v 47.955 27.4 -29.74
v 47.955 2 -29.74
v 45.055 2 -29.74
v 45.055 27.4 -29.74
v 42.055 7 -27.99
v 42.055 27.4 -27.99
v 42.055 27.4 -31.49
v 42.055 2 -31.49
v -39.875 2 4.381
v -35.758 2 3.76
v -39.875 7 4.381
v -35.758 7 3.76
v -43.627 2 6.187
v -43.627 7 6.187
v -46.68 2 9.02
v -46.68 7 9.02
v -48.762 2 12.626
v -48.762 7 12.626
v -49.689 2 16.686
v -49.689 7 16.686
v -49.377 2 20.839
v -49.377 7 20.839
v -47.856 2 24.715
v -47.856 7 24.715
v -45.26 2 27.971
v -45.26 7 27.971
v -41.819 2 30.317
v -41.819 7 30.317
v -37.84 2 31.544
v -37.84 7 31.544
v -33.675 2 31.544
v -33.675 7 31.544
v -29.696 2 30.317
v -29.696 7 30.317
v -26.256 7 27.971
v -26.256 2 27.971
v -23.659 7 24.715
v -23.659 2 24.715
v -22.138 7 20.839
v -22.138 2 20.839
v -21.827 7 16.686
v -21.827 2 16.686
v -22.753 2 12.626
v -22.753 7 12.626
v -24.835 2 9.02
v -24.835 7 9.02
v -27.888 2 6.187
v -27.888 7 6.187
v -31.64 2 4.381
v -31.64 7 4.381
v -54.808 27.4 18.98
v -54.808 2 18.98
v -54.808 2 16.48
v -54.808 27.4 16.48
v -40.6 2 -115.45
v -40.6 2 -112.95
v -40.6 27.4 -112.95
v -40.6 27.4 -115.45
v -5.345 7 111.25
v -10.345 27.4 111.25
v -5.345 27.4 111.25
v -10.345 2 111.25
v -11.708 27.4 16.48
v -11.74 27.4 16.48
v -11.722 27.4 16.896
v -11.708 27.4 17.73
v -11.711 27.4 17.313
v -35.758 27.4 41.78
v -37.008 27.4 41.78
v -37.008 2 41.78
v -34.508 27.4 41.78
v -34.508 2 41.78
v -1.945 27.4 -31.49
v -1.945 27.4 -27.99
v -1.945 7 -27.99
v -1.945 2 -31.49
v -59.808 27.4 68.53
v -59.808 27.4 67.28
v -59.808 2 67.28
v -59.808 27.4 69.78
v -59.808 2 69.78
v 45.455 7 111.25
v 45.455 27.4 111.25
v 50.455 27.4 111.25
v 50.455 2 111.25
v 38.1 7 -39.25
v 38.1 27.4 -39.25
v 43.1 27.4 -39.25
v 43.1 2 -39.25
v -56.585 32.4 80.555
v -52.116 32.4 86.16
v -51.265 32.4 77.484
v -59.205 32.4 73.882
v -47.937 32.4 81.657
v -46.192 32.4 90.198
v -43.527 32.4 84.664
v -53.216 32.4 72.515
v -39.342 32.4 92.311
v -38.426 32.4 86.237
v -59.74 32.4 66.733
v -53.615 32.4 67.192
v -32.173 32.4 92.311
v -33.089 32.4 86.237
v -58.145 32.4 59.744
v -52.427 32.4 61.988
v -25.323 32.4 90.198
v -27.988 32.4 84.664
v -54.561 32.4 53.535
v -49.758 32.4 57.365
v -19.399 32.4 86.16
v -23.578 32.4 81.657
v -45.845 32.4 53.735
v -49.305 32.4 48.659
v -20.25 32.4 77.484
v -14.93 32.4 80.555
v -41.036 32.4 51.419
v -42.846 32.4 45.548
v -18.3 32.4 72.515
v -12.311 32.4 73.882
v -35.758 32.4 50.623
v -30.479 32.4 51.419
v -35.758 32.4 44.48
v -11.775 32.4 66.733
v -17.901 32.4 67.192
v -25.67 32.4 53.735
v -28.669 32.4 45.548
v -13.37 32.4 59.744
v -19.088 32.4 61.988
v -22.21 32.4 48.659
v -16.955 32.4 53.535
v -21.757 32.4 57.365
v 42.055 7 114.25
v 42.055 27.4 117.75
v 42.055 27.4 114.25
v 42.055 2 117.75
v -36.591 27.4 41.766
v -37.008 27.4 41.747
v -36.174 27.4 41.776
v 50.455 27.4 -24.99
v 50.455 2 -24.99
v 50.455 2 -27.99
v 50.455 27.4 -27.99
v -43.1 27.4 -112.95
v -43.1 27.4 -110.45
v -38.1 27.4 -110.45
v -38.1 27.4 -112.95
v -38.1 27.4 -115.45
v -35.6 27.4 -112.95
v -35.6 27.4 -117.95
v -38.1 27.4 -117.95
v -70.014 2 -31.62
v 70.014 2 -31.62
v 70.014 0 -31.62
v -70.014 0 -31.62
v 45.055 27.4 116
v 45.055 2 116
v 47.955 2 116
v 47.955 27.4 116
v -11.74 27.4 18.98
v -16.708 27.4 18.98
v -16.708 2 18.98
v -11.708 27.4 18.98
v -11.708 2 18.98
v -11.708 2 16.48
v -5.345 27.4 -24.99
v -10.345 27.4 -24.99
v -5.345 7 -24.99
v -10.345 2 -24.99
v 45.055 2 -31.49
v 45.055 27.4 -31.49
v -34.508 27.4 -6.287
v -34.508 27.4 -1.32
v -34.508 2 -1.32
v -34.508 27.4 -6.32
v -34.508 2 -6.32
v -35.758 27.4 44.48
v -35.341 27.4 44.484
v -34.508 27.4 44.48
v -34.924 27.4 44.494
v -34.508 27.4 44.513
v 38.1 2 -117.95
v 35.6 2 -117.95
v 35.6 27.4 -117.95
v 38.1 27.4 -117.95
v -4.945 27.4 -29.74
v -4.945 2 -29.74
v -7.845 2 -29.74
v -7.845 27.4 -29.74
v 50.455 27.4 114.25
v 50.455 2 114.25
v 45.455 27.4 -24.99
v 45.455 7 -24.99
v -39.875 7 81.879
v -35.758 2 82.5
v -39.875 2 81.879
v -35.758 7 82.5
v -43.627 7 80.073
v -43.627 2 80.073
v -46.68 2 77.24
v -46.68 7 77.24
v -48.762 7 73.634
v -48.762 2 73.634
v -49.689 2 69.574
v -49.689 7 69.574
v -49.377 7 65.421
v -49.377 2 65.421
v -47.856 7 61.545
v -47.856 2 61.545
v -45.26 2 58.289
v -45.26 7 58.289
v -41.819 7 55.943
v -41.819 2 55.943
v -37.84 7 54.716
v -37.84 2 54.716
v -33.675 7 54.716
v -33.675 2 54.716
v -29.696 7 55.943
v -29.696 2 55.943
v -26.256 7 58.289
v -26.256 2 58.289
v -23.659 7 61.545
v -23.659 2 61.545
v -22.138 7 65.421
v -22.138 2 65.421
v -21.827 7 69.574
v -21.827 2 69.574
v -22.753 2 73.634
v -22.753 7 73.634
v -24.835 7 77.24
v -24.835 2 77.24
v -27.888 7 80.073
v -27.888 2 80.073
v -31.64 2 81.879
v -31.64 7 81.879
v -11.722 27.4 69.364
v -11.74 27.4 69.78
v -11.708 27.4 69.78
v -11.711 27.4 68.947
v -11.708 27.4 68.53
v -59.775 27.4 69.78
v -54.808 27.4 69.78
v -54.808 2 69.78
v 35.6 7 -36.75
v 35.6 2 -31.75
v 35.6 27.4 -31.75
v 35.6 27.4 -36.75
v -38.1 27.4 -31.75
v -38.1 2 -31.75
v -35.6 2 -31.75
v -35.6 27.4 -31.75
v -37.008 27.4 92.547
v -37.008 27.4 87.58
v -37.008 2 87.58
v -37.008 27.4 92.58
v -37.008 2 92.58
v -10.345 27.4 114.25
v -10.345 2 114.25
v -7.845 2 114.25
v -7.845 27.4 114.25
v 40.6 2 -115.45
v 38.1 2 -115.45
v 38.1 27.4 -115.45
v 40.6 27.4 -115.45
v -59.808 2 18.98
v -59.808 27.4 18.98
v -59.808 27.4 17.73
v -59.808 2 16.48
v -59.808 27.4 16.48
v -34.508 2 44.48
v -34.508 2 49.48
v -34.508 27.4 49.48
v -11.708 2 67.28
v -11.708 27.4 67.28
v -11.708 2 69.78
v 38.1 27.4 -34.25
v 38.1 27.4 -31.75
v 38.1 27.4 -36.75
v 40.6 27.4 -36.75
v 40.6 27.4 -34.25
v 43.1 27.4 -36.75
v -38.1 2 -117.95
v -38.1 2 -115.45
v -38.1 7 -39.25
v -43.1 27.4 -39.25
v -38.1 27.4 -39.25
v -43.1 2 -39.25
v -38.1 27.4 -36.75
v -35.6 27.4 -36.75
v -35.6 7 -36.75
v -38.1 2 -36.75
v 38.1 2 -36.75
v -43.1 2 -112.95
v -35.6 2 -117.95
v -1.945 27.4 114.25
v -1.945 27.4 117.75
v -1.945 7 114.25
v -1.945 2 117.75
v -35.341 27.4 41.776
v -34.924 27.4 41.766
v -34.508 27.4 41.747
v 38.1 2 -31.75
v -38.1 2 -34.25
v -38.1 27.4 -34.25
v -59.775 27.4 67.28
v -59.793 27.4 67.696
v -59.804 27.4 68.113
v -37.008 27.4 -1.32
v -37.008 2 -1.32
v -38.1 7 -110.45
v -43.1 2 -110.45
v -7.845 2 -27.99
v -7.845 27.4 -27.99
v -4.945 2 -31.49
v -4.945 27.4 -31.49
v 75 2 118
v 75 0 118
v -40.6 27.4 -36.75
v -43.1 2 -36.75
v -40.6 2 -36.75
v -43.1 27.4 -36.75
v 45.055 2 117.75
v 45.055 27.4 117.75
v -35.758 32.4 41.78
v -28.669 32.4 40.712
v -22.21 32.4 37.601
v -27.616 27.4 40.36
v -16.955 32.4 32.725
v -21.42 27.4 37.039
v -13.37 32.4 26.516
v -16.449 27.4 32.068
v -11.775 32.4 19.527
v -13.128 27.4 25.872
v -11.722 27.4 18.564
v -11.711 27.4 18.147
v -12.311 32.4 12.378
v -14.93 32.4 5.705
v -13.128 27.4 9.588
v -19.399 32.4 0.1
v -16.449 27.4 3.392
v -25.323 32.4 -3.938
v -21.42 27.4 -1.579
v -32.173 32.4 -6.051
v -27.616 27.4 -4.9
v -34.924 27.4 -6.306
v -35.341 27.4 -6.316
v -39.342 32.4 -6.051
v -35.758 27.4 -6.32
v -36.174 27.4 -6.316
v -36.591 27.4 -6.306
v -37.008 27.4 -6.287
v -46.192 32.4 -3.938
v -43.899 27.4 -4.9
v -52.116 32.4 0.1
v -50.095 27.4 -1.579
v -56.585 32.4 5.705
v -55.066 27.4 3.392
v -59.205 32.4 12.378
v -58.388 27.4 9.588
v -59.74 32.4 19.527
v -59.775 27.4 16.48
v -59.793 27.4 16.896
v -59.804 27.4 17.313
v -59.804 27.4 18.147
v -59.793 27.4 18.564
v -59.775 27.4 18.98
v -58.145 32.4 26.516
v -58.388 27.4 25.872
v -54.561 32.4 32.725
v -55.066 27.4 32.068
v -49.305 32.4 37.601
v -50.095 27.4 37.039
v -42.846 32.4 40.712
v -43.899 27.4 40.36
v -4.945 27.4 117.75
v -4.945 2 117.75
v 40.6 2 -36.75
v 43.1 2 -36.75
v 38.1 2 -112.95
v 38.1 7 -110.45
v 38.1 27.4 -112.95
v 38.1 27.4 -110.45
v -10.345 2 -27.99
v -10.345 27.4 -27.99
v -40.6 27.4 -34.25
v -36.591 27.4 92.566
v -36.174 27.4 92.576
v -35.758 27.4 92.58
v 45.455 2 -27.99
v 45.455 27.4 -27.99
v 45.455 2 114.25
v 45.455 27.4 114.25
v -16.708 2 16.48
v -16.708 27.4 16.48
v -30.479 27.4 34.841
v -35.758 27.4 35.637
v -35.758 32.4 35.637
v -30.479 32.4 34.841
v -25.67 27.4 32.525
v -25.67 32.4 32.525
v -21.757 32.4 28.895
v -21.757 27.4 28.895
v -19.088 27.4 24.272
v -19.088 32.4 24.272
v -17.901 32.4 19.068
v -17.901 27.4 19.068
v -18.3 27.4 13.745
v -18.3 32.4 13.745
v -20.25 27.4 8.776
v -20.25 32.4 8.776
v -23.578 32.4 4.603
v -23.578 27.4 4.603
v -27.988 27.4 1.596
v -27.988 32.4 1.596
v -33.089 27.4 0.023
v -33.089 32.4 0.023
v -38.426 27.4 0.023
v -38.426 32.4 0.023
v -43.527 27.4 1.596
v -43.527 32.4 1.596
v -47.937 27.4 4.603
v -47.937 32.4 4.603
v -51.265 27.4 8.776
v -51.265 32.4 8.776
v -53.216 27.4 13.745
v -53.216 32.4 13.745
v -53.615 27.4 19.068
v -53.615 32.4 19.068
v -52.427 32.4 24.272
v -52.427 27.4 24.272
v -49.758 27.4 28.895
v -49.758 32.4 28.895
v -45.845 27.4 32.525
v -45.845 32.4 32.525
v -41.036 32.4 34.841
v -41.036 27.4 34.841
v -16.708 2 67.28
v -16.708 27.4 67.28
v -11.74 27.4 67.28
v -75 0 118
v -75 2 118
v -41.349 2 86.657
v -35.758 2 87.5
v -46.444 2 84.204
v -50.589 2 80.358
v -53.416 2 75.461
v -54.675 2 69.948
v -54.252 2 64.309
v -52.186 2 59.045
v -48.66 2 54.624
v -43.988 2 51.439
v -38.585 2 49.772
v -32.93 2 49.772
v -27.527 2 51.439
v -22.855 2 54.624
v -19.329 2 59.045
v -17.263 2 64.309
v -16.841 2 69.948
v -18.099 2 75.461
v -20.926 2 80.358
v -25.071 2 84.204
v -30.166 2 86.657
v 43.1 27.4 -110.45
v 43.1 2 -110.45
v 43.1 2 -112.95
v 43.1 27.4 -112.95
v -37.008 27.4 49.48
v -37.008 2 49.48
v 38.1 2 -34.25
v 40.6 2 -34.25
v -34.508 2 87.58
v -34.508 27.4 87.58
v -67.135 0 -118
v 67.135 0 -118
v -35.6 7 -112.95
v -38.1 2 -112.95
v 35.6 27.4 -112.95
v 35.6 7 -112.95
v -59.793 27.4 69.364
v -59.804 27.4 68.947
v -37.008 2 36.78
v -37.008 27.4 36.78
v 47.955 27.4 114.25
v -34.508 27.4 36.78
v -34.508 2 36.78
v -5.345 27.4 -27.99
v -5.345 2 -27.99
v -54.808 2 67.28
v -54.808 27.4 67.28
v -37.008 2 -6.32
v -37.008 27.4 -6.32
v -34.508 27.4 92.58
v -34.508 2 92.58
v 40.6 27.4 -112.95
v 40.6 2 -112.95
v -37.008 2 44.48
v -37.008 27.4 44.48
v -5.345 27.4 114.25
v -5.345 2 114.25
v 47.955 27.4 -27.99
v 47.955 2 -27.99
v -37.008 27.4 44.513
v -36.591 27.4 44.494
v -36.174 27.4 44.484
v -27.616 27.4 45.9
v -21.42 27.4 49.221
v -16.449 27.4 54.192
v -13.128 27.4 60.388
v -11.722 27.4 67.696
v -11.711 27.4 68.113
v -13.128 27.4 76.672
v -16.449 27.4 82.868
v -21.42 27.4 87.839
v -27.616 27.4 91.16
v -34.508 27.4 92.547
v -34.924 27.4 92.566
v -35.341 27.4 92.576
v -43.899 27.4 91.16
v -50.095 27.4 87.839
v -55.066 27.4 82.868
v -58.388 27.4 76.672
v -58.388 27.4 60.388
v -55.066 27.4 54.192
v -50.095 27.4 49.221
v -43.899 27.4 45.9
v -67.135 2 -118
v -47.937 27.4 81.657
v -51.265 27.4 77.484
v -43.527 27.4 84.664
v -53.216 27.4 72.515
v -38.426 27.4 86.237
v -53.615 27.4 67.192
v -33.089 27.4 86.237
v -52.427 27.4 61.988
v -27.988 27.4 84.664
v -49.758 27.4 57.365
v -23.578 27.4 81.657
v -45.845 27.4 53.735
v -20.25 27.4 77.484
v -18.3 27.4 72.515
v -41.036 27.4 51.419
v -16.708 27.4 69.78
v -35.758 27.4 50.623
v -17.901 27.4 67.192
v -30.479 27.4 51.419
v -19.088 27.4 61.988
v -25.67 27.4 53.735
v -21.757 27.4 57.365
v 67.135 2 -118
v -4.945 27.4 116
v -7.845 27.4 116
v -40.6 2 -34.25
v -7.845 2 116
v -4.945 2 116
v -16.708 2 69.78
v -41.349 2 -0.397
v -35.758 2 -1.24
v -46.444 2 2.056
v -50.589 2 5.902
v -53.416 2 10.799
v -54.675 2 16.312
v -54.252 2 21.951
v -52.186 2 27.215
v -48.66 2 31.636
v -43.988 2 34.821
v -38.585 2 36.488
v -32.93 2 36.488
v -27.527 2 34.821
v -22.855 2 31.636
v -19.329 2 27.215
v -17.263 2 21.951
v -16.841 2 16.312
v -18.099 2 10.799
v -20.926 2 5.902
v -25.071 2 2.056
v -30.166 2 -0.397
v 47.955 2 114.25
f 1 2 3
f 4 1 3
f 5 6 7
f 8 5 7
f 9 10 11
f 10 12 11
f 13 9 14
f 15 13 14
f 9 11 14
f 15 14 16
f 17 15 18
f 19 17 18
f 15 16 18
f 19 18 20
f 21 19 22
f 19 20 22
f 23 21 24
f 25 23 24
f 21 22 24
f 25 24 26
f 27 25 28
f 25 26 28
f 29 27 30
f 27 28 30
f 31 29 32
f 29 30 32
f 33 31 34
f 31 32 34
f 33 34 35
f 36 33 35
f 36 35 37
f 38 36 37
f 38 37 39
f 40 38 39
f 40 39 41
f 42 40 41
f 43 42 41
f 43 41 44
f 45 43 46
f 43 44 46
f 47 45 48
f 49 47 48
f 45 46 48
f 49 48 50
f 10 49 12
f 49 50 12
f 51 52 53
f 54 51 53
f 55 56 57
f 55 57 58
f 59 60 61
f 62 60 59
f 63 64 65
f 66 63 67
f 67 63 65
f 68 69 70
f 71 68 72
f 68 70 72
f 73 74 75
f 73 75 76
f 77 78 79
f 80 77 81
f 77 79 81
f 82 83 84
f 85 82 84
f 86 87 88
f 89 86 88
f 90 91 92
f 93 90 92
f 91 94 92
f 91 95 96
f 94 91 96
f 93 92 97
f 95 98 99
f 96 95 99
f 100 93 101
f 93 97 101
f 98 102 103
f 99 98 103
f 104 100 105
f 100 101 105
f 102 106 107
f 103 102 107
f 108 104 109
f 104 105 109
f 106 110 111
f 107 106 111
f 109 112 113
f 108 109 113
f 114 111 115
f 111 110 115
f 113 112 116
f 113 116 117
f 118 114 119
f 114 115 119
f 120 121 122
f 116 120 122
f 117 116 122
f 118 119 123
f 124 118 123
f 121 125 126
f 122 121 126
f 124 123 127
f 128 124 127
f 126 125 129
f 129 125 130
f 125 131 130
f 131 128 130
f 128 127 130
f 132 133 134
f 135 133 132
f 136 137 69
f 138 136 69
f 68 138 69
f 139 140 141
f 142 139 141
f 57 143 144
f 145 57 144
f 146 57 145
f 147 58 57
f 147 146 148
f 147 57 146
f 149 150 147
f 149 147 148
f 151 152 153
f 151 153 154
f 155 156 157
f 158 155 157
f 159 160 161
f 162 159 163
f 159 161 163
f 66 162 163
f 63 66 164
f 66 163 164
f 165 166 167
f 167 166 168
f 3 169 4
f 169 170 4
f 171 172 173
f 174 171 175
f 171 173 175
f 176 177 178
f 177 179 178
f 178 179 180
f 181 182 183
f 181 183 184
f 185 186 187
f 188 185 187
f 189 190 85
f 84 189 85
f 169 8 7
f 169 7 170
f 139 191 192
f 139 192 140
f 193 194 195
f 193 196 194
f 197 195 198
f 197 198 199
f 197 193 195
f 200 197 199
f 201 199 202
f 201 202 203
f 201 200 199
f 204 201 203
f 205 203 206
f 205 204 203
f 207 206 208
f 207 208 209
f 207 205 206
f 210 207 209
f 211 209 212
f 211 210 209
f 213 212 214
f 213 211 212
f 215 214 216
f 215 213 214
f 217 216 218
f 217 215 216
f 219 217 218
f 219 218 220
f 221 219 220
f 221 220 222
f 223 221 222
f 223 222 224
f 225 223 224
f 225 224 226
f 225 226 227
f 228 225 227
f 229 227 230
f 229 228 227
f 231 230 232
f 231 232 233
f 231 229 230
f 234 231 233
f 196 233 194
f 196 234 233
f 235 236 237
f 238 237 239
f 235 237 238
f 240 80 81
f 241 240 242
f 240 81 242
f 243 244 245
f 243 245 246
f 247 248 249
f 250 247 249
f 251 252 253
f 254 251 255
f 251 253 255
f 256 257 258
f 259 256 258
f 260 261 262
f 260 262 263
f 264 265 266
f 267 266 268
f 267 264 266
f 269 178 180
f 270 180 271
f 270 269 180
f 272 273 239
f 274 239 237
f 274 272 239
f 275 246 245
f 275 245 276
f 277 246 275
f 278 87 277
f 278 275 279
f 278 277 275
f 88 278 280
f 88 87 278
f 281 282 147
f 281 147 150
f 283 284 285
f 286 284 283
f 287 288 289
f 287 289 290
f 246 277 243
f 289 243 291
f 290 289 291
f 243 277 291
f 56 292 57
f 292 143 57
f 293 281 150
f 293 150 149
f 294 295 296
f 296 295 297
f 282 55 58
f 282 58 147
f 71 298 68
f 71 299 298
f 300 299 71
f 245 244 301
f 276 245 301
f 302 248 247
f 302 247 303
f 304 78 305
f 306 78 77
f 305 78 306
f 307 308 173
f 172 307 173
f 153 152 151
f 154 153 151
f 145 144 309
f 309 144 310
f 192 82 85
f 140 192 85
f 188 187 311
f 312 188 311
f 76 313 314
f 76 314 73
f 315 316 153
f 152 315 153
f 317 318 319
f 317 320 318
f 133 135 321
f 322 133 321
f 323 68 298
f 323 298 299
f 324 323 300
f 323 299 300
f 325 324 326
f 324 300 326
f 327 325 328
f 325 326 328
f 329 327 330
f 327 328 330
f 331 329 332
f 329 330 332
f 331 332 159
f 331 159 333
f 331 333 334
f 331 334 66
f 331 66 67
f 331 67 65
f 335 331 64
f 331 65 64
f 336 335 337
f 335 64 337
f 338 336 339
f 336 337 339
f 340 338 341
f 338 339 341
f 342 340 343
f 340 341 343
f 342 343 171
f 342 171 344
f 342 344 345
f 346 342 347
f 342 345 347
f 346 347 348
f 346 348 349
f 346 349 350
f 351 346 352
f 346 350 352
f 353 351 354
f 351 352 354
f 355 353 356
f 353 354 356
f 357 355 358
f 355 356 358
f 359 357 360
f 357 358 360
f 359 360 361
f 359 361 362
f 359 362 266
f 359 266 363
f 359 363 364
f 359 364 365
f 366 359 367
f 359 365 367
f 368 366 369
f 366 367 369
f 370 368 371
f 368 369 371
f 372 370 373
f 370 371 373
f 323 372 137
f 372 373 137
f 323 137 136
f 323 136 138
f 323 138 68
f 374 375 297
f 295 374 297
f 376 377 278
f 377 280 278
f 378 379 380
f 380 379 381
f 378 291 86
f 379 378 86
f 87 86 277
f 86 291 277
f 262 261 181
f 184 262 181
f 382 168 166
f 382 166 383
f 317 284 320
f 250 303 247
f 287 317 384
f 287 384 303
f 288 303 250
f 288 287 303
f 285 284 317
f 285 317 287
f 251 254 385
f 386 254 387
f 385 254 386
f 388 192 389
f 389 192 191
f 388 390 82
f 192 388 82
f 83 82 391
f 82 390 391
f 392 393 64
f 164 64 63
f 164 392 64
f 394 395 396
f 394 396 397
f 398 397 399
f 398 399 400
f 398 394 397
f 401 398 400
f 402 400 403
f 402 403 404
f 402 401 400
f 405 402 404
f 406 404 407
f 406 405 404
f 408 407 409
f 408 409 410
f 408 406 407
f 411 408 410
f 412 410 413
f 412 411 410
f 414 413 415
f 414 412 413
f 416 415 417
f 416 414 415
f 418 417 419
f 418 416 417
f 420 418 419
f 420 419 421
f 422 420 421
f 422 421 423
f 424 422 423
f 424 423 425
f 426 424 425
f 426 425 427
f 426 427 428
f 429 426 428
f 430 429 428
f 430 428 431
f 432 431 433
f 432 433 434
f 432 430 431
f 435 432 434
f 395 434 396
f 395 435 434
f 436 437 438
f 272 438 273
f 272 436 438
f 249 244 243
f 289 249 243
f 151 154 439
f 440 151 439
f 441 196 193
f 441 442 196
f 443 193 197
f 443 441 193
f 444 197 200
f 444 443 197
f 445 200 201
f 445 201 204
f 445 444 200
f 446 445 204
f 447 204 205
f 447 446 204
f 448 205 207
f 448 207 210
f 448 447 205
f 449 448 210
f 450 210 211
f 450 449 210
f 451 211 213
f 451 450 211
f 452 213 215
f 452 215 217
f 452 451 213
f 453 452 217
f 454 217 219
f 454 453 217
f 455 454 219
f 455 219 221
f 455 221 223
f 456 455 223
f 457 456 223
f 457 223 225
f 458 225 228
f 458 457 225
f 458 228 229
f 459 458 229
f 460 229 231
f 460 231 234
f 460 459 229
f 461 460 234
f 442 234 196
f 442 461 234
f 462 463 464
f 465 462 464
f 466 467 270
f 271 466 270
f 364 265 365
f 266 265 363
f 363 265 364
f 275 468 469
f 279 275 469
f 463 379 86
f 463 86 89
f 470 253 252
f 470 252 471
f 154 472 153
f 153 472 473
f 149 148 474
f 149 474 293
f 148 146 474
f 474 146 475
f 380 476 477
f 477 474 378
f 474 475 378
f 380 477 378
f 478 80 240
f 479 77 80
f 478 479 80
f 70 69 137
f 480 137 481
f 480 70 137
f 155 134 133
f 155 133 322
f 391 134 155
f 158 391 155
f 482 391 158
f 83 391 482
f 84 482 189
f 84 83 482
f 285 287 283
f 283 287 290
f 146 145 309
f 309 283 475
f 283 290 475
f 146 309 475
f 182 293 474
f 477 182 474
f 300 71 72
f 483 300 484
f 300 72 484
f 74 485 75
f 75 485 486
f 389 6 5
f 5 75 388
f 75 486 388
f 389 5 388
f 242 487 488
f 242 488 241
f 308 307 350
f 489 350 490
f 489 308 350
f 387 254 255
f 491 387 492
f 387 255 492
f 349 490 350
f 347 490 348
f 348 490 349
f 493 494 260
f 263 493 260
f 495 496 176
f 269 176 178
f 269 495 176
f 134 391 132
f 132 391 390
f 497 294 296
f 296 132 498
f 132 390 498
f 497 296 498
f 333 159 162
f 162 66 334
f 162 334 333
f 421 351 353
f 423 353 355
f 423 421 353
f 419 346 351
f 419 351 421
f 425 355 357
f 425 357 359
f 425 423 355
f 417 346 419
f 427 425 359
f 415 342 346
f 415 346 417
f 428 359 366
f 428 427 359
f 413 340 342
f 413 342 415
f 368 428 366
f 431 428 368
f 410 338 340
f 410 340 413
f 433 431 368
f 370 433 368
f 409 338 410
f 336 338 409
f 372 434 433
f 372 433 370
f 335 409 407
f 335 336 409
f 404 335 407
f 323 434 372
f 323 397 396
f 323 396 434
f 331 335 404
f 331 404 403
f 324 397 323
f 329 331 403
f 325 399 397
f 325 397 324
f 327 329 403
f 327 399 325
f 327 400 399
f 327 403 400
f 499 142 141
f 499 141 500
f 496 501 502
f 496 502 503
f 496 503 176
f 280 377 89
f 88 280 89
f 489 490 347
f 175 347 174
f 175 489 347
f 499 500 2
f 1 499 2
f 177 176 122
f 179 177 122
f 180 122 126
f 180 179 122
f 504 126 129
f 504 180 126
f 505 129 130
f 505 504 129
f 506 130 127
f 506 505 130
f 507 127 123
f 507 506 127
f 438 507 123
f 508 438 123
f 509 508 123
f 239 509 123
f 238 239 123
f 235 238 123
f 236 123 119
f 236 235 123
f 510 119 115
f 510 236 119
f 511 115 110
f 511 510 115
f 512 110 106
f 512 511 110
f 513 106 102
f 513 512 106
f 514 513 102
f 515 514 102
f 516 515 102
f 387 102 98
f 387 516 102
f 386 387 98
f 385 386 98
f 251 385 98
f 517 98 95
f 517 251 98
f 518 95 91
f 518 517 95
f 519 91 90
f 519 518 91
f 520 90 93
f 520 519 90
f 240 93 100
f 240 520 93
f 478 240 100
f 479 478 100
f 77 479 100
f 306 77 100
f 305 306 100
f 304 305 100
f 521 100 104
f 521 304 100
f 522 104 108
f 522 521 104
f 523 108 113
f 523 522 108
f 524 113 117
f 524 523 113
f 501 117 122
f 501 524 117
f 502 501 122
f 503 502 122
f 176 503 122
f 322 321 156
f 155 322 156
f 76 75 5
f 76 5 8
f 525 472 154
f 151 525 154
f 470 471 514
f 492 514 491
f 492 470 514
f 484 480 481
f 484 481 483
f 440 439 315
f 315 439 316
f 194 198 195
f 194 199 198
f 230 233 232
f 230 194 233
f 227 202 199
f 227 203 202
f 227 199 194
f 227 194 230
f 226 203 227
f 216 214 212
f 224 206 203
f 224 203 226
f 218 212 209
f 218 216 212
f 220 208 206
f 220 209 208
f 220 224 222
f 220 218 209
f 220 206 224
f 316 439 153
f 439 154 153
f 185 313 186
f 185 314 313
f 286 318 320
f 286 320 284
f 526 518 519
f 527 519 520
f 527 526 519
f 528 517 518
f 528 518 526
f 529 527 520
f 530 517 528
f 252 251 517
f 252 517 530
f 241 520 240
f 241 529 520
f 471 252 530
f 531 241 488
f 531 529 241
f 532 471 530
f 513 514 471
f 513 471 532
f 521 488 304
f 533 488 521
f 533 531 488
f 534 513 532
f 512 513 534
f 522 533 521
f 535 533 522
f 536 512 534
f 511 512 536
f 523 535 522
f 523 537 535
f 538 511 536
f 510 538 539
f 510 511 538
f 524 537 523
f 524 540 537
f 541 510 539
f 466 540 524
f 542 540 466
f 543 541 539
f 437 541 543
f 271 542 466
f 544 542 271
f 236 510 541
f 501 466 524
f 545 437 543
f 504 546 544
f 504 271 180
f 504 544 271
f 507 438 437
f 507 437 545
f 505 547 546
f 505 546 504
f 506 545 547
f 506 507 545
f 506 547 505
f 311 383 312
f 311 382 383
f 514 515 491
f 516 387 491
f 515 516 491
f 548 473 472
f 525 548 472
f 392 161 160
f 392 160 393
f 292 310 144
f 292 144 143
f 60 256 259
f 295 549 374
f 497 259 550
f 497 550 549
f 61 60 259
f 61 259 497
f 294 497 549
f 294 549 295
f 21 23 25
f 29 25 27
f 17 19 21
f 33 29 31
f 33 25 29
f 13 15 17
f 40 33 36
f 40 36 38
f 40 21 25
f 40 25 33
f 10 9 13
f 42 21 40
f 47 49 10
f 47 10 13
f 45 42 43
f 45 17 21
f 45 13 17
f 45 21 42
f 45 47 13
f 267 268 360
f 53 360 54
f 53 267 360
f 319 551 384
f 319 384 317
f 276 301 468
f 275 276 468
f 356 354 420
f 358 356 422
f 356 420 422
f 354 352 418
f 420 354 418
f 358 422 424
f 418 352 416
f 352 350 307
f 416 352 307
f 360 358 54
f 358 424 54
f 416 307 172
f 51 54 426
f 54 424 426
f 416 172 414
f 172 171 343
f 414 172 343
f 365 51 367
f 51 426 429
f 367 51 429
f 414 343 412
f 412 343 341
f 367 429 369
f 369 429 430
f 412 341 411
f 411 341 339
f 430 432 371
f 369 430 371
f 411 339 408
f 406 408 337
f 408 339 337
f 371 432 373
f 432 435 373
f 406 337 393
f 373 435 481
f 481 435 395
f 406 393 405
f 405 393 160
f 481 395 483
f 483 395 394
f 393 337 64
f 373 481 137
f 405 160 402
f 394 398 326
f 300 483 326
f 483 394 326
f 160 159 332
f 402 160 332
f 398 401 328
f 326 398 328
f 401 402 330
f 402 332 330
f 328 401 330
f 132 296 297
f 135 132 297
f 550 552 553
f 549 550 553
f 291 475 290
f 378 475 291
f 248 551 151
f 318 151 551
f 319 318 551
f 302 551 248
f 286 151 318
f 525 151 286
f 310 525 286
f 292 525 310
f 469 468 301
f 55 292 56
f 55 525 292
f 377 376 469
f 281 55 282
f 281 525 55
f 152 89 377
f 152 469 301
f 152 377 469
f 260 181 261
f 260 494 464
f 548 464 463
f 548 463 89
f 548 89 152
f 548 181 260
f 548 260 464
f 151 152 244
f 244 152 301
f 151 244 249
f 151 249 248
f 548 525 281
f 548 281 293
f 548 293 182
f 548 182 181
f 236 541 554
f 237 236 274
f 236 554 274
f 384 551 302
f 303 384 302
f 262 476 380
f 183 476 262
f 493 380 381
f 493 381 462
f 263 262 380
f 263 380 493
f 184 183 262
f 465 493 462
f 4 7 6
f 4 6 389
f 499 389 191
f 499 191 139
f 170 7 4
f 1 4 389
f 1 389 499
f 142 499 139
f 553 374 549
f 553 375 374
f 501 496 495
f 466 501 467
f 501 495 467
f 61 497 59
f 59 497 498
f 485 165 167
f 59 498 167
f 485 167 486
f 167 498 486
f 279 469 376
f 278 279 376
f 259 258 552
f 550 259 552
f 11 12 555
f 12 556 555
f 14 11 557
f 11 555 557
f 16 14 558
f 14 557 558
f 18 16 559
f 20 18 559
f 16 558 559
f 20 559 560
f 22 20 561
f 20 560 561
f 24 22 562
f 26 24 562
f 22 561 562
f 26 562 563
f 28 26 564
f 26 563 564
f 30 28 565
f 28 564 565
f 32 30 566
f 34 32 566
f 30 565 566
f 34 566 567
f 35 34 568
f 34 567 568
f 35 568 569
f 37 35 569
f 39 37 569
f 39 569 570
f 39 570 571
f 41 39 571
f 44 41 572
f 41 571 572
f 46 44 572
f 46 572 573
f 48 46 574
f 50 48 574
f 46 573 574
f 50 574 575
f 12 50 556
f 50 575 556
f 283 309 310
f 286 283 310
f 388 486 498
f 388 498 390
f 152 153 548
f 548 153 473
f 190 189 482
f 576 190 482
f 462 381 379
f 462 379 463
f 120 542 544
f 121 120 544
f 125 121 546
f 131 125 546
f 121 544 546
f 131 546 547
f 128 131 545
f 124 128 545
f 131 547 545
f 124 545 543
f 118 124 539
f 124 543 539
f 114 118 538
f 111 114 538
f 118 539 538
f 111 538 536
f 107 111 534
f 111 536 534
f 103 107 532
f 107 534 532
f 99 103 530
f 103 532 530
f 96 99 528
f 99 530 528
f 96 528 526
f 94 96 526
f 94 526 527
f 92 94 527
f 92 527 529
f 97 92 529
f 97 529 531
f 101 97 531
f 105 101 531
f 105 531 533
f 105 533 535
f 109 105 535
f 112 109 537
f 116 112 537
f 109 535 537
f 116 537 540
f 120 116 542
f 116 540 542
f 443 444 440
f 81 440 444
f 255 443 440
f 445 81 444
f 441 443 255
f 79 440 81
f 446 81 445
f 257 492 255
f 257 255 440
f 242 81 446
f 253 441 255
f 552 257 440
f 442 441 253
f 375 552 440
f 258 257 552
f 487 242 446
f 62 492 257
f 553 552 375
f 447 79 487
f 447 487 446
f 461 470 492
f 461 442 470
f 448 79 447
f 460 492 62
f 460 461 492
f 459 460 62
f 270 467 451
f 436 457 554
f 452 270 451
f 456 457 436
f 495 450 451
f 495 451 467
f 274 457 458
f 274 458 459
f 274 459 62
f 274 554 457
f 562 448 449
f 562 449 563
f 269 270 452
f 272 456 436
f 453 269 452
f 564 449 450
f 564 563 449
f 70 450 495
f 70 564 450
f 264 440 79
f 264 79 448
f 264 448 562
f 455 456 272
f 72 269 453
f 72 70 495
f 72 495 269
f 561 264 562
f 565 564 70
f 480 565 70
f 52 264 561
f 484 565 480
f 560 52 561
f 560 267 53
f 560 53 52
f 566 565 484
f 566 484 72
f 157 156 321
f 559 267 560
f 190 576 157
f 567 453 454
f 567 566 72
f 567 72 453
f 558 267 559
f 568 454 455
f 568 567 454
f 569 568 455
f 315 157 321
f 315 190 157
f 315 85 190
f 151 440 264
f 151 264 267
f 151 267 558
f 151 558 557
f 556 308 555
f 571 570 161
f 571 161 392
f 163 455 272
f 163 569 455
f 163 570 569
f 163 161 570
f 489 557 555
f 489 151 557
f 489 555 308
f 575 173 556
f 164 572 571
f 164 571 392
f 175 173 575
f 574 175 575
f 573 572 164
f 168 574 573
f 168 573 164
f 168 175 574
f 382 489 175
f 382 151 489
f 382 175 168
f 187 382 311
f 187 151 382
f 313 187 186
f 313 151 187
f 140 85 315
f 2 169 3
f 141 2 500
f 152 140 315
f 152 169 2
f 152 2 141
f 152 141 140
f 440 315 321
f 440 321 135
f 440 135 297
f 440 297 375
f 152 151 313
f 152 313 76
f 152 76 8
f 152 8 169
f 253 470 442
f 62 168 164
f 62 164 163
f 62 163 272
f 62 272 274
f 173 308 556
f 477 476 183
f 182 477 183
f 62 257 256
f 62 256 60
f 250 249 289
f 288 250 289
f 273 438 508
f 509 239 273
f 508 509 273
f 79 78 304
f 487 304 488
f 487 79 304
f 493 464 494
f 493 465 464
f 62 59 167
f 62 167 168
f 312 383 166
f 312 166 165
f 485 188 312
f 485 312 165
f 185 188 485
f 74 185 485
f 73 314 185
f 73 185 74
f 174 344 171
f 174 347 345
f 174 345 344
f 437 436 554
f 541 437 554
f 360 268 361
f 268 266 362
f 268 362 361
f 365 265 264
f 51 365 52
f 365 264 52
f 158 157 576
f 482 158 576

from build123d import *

# Parameters (mm, degrees)
BOSS_EXTRUDE1_DEPTH  = 2
BOSS_EXTRUDE2_DEPTH  = 76.2
BOSS_EXTRUDE7_DEPTH  = 38
BOSS_EXTRUDE9_DEPTH  = 71.12
SKETCH19_W           = 5
SKETCH19_H           = 2.5
SKETCH19_W_2         = 2.5
SKETCH19_H_2         = 5
BOSS_EXTRUDE13_DEPTH = 25.4
SKETCH20_R           = 24.05
SKETCH20_R_2         = 17.907
BOSS_EXTRUDE14_DEPTH = 5
SKETCH21_W           = 2.5
SKETCH21_H           = 5
SKETCH21_H_2         = 2.5
SKETCH21_W_2         = 5
BOSS_EXTRUDE15_DEPTH = 25.4
BOSS_EXTRUDE16_DEPTH = 25
BOSS_EXTRUDE17_REACH = 145.084
SKETCH24_W           = 5
SKETCH24_H           = 3
SKETCH24_W_2         = 3
SKETCH24_H_2         = 3.5


with BuildPart() as part:
    # Sketch1 → Boss-Extrude1 (new body)
    with BuildSketch(Plane(origin=(0, 0, 0), x_dir=(1, 0, 0), z_dir=(0, 1, 0))):
        Polygon((0, 118), (0, -118), (75, -118), (67.135, 118), align=None)
        Polygon((-75, -118), (0, -118), (0, 118), (-67.135, 118), align=None)
    extrude(amount=BOSS_EXTRUDE1_DEPTH)

    # Sketch7 → Boss-Extrude2 (add)
    with BuildSketch(Plane.XY.offset(-36.75)):
        Polygon((-38.1, 2), (-38.1, 7), (-43.1, 2), align=None)
    boss_extrude2 = extrude(amount=-BOSS_EXTRUDE2_DEPTH)

    # Mirror1: Boss-Extrude2 across plane
    add(boss_extrude2.mirror(Plane(origin=(0, 0, 0), x_dir=(0, 0, 1), z_dir=(1, 0, 0))))

    # Sketch9 → Boss-Extrude7 (add, symmetric)
    with BuildSketch(Plane(origin=(0, 0, 0), x_dir=(0, 0, -1), z_dir=(1, 0, 0))):
        Polygon((112.95, 2), (117.95, 2), (112.95, 7), align=None)
    boss_extrude7 = extrude(amount=BOSS_EXTRUDE7_DEPTH, both=True)

    # Mirror2: Boss-Extrude7 across plane
    add(boss_extrude7.mirror(Plane.XY.offset(-74.85)))

    # Sketch12 → Boss-Extrude9 (add, symmetric)
    with BuildSketch(Plane.XY.offset(43.13)):
        Polygon((-10.345454545, 2), (-5.345454545, 2), (-5.345454545, 7), align=None)
    boss_extrude9 = extrude(amount=BOSS_EXTRUDE9_DEPTH, both=True)

    # Mirror4: Boss-Extrude9 across plane
    add(boss_extrude9.mirror(Plane(origin=(20.054545455, 0, 0), x_dir=(0, 0, 1), z_dir=(1, 0, 0))))

    # Sketch17 → Revolve1 (revolve)
    with BuildSketch(Plane.XY.offset(17.73), mode=Mode.PRIVATE) as revolve1_sk:
        Polygon((-49.727575758, 2), (-49.727575758, 7), (-54.727575758, 2), align=None)
    revolve1 = revolve(revolve1_sk.sketch.rotate(Axis((-35.757575758, 2, 17.73), (0, 1, 0)), 270), axis=Axis((-35.757575758, 2, 17.73), (0, 1, 0)))

    # Mirror7: Revolve1 across plane
    add(revolve1.mirror(Plane.XY.offset(43.13)))

    # Sketch19 → Boss-Extrude13 (add)
    with BuildSketch(Plane(origin=(0, 2, 0), x_dir=(1, 0, 0), z_dir=(0, 1, 0))):
        with Locations((-57.307575758, -17.73)):
            Rectangle(SKETCH19_W, SKETCH19_H)
        with Locations((-35.757575758, -39.28)):
            Rectangle(SKETCH19_W_2, SKETCH19_H_2)
        with Locations((-35.757575758, 3.82)):
            Rectangle(SKETCH19_W_2, SKETCH19_H_2)
        with Locations((-14.207575758, -17.73)):
            Rectangle(SKETCH19_W, SKETCH19_H)
    boss_extrude13 = extrude(amount=BOSS_EXTRUDE13_DEPTH)

    # Sketch20 → Boss-Extrude14 (add)
    with BuildSketch(Plane(origin=(0, 27.4, 0), x_dir=(1, 0, 0), z_dir=(0, 1, 0))):
        with Locations(Location((-35.757575758, -17.73, 0), (0, 0, 270))):
            Circle(SKETCH20_R)
        with Locations(Location((-35.757575758, -17.73, 0), (0, 0, 270))):
            Circle(SKETCH20_R_2, mode=Mode.SUBTRACT)
    boss_extrude14 = extrude(amount=BOSS_EXTRUDE14_DEPTH)

    # Mirror8: Boss-Extrude13, Boss-Extrude14 across plane
    add(boss_extrude13.mirror(Plane.XY.offset(43.13)))
    add(boss_extrude14.mirror(Plane.XY.offset(43.13)))

    # Sketch21 → Boss-Extrude15 (add)
    with BuildSketch(Plane(origin=(0, 2, 0), x_dir=(1, 0, 0), z_dir=(0, 1, 0))):
        with Locations((-36.85, 115.45)):
            Rectangle(SKETCH21_W, SKETCH21_H)
        with Locations((-39.35, 114.2)):
            Rectangle(SKETCH21_W, SKETCH21_H_2)
        with Locations((-40.6, 111.7)):
            Rectangle(SKETCH21_W_2, SKETCH21_H_2)
        with Locations((-40.6, 38)):
            Rectangle(SKETCH21_W_2, SKETCH21_H_2)
        with Locations((-39.35, 35.5)):
            Rectangle(SKETCH21_W, SKETCH21_H_2)
        with Locations((-36.85, 34.25)):
            Rectangle(SKETCH21_W, SKETCH21_H)
        with Locations((40.6, 38)):
            Rectangle(SKETCH21_W_2, SKETCH21_H_2)
        with Locations((39.35, 35.5)):
            Rectangle(SKETCH21_W, SKETCH21_H_2)
        with Locations((36.85, 34.25)):
            Rectangle(SKETCH21_W, SKETCH21_H)
        with Locations((36.85, 115.45)):
            Rectangle(SKETCH21_W, SKETCH21_H)
        with Locations((40.6, 111.7)):
            Rectangle(SKETCH21_W_2, SKETCH21_H_2)
        with Locations((39.35, 114.2)):
            Rectangle(SKETCH21_W, SKETCH21_H_2)
    extrude(amount=BOSS_EXTRUDE15_DEPTH)

    # Sketch23 → Boss-Extrude16 (add, symmetric)
    with BuildSketch(Plane(origin=(20.054545455, 0, 0), x_dir=(0, 0, -1), z_dir=(1, 0, 0))):
        Polygon((27.99, 2), (27.99, 7), (31.49, 2), align=None)
    boss_extrude16 = extrude(amount=BOSS_EXTRUDE16_DEPTH, both=True)

    # Mirror10: Boss-Extrude16 across plane
    add(boss_extrude16.mirror(Plane.XY.offset(43.13)))

    # Boss-Extrude17: up to this face of the body (flat: up to its plane)
    boss_extrude17_end = Plane(part.part.faces().sort_by_distance((-38.85, 27.4, -36))[0])
    # Sketch24 → Boss-Extrude17 (add, up to the picked face)
    with BuildSketch(Plane(origin=(0, 2, 0), x_dir=(1, 0, 0), z_dir=(0, 1, 0)), mode=Mode.PRIVATE) as boss_extrude17_sk1:
        with Locations((-7.845454545, 26.49)):
            Rectangle(SKETCH24_W, SKETCH24_H)
    boss_extrude17_tool1 = split(extrude(boss_extrude17_sk1.sketch, amount=BOSS_EXTRUDE17_REACH, mode=Mode.PRIVATE), bisect_by=boss_extrude17_end, keep=Keep.BOTH, mode=Mode.PRIVATE)
    # Sketch24 → Boss-Extrude17 (add, up to the picked face)
    with BuildSketch(Plane(origin=(0, 2, 0), x_dir=(1, 0, 0), z_dir=(0, 1, 0)), mode=Mode.PRIVATE) as boss_extrude17_sk2:
        Polygon((-4.945454545, 27.99), (-4.945454545, 29.74), (-7.845454545, 29.74), (-7.845454545, 27.99), (-5.345454545, 27.99), align=None)
    boss_extrude17_tool2 = split(extrude(boss_extrude17_sk2.sketch, amount=BOSS_EXTRUDE17_REACH, mode=Mode.PRIVATE), bisect_by=boss_extrude17_end, keep=Keep.BOTH, mode=Mode.PRIVATE)
    # Sketch24 → Boss-Extrude17 (add, up to the picked face)
    with BuildSketch(Plane(origin=(0, 2, 0), x_dir=(1, 0, 0), z_dir=(0, 1, 0)), mode=Mode.PRIVATE) as boss_extrude17_sk3:
        with Locations((-3.445454545, 29.74)):
            Rectangle(SKETCH24_W_2, SKETCH24_H_2)
    boss_extrude17_tool3 = split(extrude(boss_extrude17_sk3.sketch, amount=BOSS_EXTRUDE17_REACH, mode=Mode.PRIVATE), bisect_by=boss_extrude17_end, keep=Keep.BOTH, mode=Mode.PRIVATE)
    # Sketch24 → Boss-Extrude17 (add, up to the picked face)
    with BuildSketch(Plane(origin=(0, 2, 0), x_dir=(1, 0, 0), z_dir=(0, 1, 0)), mode=Mode.PRIVATE) as boss_extrude17_sk4:
        with Locations((43.554545455, 29.74)):
            Rectangle(SKETCH24_W_2, SKETCH24_H_2)
    boss_extrude17_tool4 = split(extrude(boss_extrude17_sk4.sketch, amount=BOSS_EXTRUDE17_REACH, mode=Mode.PRIVATE), bisect_by=boss_extrude17_end, keep=Keep.BOTH, mode=Mode.PRIVATE)
    # Sketch24 → Boss-Extrude17 (add, up to the picked face)
    with BuildSketch(Plane(origin=(0, 2, 0), x_dir=(1, 0, 0), z_dir=(0, 1, 0)), mode=Mode.PRIVATE) as boss_extrude17_sk5:
        Polygon((45.054545455, 29.74), (45.054545455, 27.99), (45.454545455, 27.99), (47.954545455, 27.99), (47.954545455, 29.74), align=None)
    boss_extrude17_tool5 = split(extrude(boss_extrude17_sk5.sketch, amount=BOSS_EXTRUDE17_REACH, mode=Mode.PRIVATE), bisect_by=boss_extrude17_end, keep=Keep.BOTH, mode=Mode.PRIVATE)
    # Sketch24 → Boss-Extrude17 (add, up to the picked face)
    with BuildSketch(Plane(origin=(0, 2, 0), x_dir=(1, 0, 0), z_dir=(0, 1, 0)), mode=Mode.PRIVATE) as boss_extrude17_sk6:
        with Locations((47.954545455, 26.49)):
            Rectangle(SKETCH24_W, SKETCH24_H)
    boss_extrude17_tool6 = split(extrude(boss_extrude17_sk6.sketch, amount=BOSS_EXTRUDE17_REACH, mode=Mode.PRIVATE), bisect_by=boss_extrude17_end, keep=Keep.BOTH, mode=Mode.PRIVATE)
    # Sketch24 → Boss-Extrude17 (add, up to the picked face)
    with BuildSketch(Plane(origin=(0, 2, 0), x_dir=(1, 0, 0), z_dir=(0, 1, 0)), mode=Mode.PRIVATE) as boss_extrude17_sk7:
        with Locations((47.954545455, -112.75)):
            Rectangle(SKETCH24_W, SKETCH24_H)
    boss_extrude17_tool7 = split(extrude(boss_extrude17_sk7.sketch, amount=BOSS_EXTRUDE17_REACH, mode=Mode.PRIVATE), bisect_by=boss_extrude17_end, keep=Keep.BOTH, mode=Mode.PRIVATE)
    # Sketch24 → Boss-Extrude17 (add, up to the picked face)
    with BuildSketch(Plane(origin=(0, 2, 0), x_dir=(1, 0, 0), z_dir=(0, 1, 0)), mode=Mode.PRIVATE) as boss_extrude17_sk8:
        Polygon((45.454545455, -114.25), (45.054545455, -114.25), (45.054545455, -116), (47.954545455, -116), (47.954545455, -114.25), align=None)
    boss_extrude17_tool8 = split(extrude(boss_extrude17_sk8.sketch, amount=BOSS_EXTRUDE17_REACH, mode=Mode.PRIVATE), bisect_by=boss_extrude17_end, keep=Keep.BOTH, mode=Mode.PRIVATE)
    # Sketch24 → Boss-Extrude17 (add, up to the picked face)
    with BuildSketch(Plane(origin=(0, 2, 0), x_dir=(1, 0, 0), z_dir=(0, 1, 0)), mode=Mode.PRIVATE) as boss_extrude17_sk9:
        with Locations((43.554545455, -116)):
            Rectangle(SKETCH24_W_2, SKETCH24_H_2)
    boss_extrude17_tool9 = split(extrude(boss_extrude17_sk9.sketch, amount=BOSS_EXTRUDE17_REACH, mode=Mode.PRIVATE), bisect_by=boss_extrude17_end, keep=Keep.BOTH, mode=Mode.PRIVATE)
    # Sketch24 → Boss-Extrude17 (add, up to the picked face)
    with BuildSketch(Plane(origin=(0, 2, 0), x_dir=(1, 0, 0), z_dir=(0, 1, 0)), mode=Mode.PRIVATE) as boss_extrude17_sk10:
        with Locations((-3.445454545, -116)):
            Rectangle(SKETCH24_W_2, SKETCH24_H_2)
    boss_extrude17_tool10 = split(extrude(boss_extrude17_sk10.sketch, amount=BOSS_EXTRUDE17_REACH, mode=Mode.PRIVATE), bisect_by=boss_extrude17_end, keep=Keep.BOTH, mode=Mode.PRIVATE)
    # Sketch24 → Boss-Extrude17 (add, up to the picked face)
    with BuildSketch(Plane(origin=(0, 2, 0), x_dir=(1, 0, 0), z_dir=(0, 1, 0)), mode=Mode.PRIVATE) as boss_extrude17_sk11:
        Polygon((-4.945454545, -116), (-4.945454545, -114.25), (-5.345454545, -114.25), (-7.845454545, -114.25), (-7.845454545, -116), align=None)
    boss_extrude17_tool11 = split(extrude(boss_extrude17_sk11.sketch, amount=BOSS_EXTRUDE17_REACH, mode=Mode.PRIVATE), bisect_by=boss_extrude17_end, keep=Keep.BOTH, mode=Mode.PRIVATE)
    # Sketch24 → Boss-Extrude17 (add, up to the picked face)
    with BuildSketch(Plane(origin=(0, 2, 0), x_dir=(1, 0, 0), z_dir=(0, 1, 0)), mode=Mode.PRIVATE) as boss_extrude17_sk12:
        with Locations((-7.845454545, -112.75)):
            Rectangle(SKETCH24_W, SKETCH24_H)
    boss_extrude17_tool12 = split(extrude(boss_extrude17_sk12.sketch, amount=BOSS_EXTRUDE17_REACH, mode=Mode.PRIVATE), bisect_by=boss_extrude17_end, keep=Keep.BOTH, mode=Mode.PRIVATE)
    add(boss_extrude17_tool1.solids().sort_by(Axis((-7.845455, 2, -26.49), (0, 1, 0)))[0])
    add(boss_extrude17_tool2.solids().sort_by(Axis((-6.395455, 2, -28.865), (0, 1, 0)))[0])
    add(boss_extrude17_tool3.solids().sort_by(Axis((-3.445455, 2, -29.74), (0, 1, 0)))[0])
    add(boss_extrude17_tool4.solids().sort_by(Axis((43.554545, 2, -29.74), (0, 1, 0)))[0])
    add(boss_extrude17_tool5.solids().sort_by(Axis((46.504545, 2, -28.865), (0, 1, 0)))[0])
    add(boss_extrude17_tool6.solids().sort_by(Axis((47.954545, 2, -26.49), (0, 1, 0)))[0])
    add(boss_extrude17_tool7.solids().sort_by(Axis((47.954545, 2, 112.75), (0, 1, 0)))[0])
    add(boss_extrude17_tool8.solids().sort_by(Axis((46.504545, 2, 115.125), (0, 1, 0)))[0])
    add(boss_extrude17_tool9.solids().sort_by(Axis((43.554545, 2, 116), (0, 1, 0)))[0])
    add(boss_extrude17_tool10.solids().sort_by(Axis((-3.445455, 2, 116), (0, 1, 0)))[0])
    add(boss_extrude17_tool11.solids().sort_by(Axis((-6.395455, 2, 115.125), (0, 1, 0)))[0])
    add(boss_extrude17_tool12.solids().sort_by(Axis((-7.845455, 2, 112.75), (0, 1, 0)))[0])


with BuildPart() as body_2:
    # Split1: the piece on the far side of the plane
    add(part.part)
    split(bisect_by=Plane(origin=(0, 0, -31.62), x_dir=(-1, 0, 0), z_dir=(0, 0, -1)), keep=Keep.BOTTOM)


with BuildPart() as part_1:
    add(part.part)

    # Split1
    split(bisect_by=Plane(origin=(0, 0, -31.62), x_dir=(-1, 0, 0), z_dir=(0, 0, -1)), keep=Keep.TOP)


solid = Compound([body_2.part, part_1.part])
